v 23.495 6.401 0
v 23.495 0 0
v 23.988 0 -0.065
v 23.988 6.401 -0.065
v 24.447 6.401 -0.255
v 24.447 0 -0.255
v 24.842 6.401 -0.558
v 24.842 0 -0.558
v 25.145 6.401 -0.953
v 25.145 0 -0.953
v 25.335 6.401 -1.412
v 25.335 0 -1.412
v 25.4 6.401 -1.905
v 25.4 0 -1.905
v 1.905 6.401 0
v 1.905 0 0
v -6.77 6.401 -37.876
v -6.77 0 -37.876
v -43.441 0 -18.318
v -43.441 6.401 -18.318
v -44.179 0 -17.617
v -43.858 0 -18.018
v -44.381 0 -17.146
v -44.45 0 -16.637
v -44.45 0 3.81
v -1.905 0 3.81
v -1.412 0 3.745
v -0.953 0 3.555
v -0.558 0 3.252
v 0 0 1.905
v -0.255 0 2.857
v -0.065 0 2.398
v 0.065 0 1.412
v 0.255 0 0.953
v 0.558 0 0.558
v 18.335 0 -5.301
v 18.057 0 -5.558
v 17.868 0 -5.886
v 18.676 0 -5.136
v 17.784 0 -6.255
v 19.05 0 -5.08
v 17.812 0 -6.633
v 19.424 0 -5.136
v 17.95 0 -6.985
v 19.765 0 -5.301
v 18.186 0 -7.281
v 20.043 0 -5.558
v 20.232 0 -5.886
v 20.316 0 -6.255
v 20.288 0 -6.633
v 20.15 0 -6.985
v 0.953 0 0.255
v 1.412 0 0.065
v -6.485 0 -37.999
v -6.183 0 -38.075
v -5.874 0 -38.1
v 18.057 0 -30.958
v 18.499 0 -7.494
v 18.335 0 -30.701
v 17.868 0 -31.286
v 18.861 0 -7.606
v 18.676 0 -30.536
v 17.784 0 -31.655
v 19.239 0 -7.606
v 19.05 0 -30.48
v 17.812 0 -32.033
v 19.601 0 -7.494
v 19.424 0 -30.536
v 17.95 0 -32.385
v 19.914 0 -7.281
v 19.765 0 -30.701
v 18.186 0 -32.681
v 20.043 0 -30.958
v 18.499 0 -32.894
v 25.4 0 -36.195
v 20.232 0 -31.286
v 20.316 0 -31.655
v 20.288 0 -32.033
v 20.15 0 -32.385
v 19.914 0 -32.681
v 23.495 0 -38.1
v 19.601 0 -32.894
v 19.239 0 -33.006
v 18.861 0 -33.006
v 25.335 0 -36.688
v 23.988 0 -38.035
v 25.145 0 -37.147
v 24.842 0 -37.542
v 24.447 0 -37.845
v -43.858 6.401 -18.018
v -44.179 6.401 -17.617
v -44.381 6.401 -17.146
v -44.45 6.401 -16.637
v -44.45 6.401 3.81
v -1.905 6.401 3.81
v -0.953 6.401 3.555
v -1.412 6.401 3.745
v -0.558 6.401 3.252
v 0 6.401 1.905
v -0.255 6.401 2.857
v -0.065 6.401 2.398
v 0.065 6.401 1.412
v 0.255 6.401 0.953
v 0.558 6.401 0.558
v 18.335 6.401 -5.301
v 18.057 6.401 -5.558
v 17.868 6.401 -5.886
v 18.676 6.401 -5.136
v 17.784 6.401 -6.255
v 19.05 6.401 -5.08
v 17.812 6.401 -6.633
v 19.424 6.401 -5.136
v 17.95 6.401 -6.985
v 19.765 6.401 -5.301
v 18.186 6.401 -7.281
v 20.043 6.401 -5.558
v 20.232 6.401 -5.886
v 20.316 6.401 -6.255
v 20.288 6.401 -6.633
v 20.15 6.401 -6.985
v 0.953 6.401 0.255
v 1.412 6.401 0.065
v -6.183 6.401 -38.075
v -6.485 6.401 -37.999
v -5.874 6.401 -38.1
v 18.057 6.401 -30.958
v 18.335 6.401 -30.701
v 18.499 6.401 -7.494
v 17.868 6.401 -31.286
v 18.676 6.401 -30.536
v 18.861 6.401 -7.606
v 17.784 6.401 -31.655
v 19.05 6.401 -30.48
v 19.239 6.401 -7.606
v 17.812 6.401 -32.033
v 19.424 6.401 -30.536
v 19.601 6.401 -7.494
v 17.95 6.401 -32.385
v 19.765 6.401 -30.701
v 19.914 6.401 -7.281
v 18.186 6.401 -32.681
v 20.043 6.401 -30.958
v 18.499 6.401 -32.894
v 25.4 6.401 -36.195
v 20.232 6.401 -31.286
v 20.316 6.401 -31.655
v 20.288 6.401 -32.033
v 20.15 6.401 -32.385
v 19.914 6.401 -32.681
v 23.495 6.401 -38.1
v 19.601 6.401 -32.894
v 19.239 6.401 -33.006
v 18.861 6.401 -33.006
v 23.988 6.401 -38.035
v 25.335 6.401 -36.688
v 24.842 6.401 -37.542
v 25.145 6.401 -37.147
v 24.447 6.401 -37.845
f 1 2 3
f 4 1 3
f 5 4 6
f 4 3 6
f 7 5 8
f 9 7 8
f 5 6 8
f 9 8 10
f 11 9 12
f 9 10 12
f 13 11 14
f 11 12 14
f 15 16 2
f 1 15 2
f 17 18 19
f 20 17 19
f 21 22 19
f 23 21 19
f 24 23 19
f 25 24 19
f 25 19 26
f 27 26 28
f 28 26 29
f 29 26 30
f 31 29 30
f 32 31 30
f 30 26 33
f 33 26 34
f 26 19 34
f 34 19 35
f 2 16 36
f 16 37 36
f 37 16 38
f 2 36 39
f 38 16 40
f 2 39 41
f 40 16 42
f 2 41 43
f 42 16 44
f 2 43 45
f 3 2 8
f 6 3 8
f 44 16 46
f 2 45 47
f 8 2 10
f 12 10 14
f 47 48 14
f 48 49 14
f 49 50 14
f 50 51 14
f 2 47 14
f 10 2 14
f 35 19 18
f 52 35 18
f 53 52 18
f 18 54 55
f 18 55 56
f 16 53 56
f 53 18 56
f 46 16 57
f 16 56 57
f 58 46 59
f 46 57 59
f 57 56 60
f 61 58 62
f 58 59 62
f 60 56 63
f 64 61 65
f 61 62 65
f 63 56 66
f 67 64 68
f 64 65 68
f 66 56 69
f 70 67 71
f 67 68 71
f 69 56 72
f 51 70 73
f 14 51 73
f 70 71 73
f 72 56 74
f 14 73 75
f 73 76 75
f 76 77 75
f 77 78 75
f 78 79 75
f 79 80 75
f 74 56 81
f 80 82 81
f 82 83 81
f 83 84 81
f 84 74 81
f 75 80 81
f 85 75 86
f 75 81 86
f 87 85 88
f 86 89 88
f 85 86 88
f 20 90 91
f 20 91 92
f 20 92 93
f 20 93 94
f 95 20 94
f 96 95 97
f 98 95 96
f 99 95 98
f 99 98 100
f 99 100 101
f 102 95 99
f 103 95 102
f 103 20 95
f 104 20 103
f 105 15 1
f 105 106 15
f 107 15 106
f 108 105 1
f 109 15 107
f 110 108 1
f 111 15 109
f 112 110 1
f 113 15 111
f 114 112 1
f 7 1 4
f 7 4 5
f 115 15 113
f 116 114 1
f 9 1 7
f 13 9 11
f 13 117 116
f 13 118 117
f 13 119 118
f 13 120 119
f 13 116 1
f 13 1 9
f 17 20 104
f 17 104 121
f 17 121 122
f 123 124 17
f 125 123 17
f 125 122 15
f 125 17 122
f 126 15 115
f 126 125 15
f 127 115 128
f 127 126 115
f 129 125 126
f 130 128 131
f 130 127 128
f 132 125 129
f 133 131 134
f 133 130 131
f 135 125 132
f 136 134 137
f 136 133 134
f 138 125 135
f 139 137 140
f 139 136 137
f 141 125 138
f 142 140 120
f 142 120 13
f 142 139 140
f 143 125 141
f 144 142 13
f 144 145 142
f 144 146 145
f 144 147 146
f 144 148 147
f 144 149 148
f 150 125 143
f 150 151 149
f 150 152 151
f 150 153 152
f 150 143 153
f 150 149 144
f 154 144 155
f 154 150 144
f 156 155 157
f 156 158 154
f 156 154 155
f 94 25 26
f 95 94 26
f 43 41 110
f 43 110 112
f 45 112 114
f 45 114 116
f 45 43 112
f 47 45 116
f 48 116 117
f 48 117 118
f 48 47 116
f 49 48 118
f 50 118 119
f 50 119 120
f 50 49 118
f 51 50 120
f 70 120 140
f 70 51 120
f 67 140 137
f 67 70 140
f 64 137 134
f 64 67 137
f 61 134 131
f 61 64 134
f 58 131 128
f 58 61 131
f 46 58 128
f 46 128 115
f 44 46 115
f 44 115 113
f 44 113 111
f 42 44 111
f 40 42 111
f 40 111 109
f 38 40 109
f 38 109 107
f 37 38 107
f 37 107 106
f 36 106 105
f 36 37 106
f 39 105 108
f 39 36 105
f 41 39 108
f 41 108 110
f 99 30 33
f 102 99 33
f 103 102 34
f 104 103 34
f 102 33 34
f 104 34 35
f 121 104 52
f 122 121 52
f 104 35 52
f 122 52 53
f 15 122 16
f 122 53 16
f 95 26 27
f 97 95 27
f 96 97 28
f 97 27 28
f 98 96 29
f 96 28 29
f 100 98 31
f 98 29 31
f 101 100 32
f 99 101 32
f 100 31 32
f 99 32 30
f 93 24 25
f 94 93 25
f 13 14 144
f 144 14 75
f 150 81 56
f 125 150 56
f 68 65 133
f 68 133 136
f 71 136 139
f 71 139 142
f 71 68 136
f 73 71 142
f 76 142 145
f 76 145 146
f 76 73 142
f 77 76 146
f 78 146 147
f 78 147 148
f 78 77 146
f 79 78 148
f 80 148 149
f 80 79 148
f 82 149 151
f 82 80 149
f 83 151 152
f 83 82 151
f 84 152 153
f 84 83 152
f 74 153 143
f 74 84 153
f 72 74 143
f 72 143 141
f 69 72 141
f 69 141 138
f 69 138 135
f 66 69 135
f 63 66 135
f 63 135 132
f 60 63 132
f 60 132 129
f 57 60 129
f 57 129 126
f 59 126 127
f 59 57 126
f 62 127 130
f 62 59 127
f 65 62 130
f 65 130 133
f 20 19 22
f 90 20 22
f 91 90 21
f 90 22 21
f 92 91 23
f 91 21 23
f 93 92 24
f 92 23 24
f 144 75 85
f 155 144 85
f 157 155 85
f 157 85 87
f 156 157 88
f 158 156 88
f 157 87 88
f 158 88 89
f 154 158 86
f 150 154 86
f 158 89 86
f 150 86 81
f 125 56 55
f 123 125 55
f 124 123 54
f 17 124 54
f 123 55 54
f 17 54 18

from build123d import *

# Parameters (mm, degrees)
SKETCH1_R           = 1.27
BOSS_EXTRUDE1_DEPTH = 6.4008


with BuildPart() as part:
    # Sketch1 → Boss-Extrude1 (new body)
    with BuildSketch(Plane(origin=(0, 0, 0), x_dir=(1, 0, 0), z_dir=(0, 1, 0))):
        with BuildLine():
            Line((1.905, 0), (23.495, 0))
            ThreePointArc((23.495, 0), (24.842038418, 0.557961582), (25.4, 1.905))
            Line((25.4, 1.905), (25.4, 36.195))
            ThreePointArc((25.4, 36.195), (24.842038418, 37.542038418), (23.495, 38.1))
            Line((23.495, 38.1), (-5.87375, 38.1))
            ThreePointArc((-5.87375, 38.1), (-6.335780366, 38.043121463), (-6.770220588, 37.875882353))
            Line((-6.770220588, 37.875882353), (-43.441470588, 18.317882353))
            ThreePointArc((-43.441470588, 18.317882353), (-44.178524023, 17.617114414), (-44.45, 16.637))
            Line((-44.45, 16.637), (-44.45, -3.81))
            Line((-44.45, -3.81), (-1.905, -3.81))
            ThreePointArc((-1.905, -3.81), (-0.557961582, -3.252038418), (0, -1.905))
            ThreePointArc((0, -1.905), (0.557961582, -0.557961582), (1.905, 0))
        make_face()
        with Locations(Location((19.05, 31.75, 0), (0, 0, 270))):
            Circle(SKETCH1_R, mode=Mode.SUBTRACT)
        with Locations(Location((19.05, 6.35, 0), (0, 0, 270))):
            Circle(SKETCH1_R, mode=Mode.SUBTRACT)
    extrude(amount=BOSS_EXTRUDE1_DEPTH)


solid = part.part
